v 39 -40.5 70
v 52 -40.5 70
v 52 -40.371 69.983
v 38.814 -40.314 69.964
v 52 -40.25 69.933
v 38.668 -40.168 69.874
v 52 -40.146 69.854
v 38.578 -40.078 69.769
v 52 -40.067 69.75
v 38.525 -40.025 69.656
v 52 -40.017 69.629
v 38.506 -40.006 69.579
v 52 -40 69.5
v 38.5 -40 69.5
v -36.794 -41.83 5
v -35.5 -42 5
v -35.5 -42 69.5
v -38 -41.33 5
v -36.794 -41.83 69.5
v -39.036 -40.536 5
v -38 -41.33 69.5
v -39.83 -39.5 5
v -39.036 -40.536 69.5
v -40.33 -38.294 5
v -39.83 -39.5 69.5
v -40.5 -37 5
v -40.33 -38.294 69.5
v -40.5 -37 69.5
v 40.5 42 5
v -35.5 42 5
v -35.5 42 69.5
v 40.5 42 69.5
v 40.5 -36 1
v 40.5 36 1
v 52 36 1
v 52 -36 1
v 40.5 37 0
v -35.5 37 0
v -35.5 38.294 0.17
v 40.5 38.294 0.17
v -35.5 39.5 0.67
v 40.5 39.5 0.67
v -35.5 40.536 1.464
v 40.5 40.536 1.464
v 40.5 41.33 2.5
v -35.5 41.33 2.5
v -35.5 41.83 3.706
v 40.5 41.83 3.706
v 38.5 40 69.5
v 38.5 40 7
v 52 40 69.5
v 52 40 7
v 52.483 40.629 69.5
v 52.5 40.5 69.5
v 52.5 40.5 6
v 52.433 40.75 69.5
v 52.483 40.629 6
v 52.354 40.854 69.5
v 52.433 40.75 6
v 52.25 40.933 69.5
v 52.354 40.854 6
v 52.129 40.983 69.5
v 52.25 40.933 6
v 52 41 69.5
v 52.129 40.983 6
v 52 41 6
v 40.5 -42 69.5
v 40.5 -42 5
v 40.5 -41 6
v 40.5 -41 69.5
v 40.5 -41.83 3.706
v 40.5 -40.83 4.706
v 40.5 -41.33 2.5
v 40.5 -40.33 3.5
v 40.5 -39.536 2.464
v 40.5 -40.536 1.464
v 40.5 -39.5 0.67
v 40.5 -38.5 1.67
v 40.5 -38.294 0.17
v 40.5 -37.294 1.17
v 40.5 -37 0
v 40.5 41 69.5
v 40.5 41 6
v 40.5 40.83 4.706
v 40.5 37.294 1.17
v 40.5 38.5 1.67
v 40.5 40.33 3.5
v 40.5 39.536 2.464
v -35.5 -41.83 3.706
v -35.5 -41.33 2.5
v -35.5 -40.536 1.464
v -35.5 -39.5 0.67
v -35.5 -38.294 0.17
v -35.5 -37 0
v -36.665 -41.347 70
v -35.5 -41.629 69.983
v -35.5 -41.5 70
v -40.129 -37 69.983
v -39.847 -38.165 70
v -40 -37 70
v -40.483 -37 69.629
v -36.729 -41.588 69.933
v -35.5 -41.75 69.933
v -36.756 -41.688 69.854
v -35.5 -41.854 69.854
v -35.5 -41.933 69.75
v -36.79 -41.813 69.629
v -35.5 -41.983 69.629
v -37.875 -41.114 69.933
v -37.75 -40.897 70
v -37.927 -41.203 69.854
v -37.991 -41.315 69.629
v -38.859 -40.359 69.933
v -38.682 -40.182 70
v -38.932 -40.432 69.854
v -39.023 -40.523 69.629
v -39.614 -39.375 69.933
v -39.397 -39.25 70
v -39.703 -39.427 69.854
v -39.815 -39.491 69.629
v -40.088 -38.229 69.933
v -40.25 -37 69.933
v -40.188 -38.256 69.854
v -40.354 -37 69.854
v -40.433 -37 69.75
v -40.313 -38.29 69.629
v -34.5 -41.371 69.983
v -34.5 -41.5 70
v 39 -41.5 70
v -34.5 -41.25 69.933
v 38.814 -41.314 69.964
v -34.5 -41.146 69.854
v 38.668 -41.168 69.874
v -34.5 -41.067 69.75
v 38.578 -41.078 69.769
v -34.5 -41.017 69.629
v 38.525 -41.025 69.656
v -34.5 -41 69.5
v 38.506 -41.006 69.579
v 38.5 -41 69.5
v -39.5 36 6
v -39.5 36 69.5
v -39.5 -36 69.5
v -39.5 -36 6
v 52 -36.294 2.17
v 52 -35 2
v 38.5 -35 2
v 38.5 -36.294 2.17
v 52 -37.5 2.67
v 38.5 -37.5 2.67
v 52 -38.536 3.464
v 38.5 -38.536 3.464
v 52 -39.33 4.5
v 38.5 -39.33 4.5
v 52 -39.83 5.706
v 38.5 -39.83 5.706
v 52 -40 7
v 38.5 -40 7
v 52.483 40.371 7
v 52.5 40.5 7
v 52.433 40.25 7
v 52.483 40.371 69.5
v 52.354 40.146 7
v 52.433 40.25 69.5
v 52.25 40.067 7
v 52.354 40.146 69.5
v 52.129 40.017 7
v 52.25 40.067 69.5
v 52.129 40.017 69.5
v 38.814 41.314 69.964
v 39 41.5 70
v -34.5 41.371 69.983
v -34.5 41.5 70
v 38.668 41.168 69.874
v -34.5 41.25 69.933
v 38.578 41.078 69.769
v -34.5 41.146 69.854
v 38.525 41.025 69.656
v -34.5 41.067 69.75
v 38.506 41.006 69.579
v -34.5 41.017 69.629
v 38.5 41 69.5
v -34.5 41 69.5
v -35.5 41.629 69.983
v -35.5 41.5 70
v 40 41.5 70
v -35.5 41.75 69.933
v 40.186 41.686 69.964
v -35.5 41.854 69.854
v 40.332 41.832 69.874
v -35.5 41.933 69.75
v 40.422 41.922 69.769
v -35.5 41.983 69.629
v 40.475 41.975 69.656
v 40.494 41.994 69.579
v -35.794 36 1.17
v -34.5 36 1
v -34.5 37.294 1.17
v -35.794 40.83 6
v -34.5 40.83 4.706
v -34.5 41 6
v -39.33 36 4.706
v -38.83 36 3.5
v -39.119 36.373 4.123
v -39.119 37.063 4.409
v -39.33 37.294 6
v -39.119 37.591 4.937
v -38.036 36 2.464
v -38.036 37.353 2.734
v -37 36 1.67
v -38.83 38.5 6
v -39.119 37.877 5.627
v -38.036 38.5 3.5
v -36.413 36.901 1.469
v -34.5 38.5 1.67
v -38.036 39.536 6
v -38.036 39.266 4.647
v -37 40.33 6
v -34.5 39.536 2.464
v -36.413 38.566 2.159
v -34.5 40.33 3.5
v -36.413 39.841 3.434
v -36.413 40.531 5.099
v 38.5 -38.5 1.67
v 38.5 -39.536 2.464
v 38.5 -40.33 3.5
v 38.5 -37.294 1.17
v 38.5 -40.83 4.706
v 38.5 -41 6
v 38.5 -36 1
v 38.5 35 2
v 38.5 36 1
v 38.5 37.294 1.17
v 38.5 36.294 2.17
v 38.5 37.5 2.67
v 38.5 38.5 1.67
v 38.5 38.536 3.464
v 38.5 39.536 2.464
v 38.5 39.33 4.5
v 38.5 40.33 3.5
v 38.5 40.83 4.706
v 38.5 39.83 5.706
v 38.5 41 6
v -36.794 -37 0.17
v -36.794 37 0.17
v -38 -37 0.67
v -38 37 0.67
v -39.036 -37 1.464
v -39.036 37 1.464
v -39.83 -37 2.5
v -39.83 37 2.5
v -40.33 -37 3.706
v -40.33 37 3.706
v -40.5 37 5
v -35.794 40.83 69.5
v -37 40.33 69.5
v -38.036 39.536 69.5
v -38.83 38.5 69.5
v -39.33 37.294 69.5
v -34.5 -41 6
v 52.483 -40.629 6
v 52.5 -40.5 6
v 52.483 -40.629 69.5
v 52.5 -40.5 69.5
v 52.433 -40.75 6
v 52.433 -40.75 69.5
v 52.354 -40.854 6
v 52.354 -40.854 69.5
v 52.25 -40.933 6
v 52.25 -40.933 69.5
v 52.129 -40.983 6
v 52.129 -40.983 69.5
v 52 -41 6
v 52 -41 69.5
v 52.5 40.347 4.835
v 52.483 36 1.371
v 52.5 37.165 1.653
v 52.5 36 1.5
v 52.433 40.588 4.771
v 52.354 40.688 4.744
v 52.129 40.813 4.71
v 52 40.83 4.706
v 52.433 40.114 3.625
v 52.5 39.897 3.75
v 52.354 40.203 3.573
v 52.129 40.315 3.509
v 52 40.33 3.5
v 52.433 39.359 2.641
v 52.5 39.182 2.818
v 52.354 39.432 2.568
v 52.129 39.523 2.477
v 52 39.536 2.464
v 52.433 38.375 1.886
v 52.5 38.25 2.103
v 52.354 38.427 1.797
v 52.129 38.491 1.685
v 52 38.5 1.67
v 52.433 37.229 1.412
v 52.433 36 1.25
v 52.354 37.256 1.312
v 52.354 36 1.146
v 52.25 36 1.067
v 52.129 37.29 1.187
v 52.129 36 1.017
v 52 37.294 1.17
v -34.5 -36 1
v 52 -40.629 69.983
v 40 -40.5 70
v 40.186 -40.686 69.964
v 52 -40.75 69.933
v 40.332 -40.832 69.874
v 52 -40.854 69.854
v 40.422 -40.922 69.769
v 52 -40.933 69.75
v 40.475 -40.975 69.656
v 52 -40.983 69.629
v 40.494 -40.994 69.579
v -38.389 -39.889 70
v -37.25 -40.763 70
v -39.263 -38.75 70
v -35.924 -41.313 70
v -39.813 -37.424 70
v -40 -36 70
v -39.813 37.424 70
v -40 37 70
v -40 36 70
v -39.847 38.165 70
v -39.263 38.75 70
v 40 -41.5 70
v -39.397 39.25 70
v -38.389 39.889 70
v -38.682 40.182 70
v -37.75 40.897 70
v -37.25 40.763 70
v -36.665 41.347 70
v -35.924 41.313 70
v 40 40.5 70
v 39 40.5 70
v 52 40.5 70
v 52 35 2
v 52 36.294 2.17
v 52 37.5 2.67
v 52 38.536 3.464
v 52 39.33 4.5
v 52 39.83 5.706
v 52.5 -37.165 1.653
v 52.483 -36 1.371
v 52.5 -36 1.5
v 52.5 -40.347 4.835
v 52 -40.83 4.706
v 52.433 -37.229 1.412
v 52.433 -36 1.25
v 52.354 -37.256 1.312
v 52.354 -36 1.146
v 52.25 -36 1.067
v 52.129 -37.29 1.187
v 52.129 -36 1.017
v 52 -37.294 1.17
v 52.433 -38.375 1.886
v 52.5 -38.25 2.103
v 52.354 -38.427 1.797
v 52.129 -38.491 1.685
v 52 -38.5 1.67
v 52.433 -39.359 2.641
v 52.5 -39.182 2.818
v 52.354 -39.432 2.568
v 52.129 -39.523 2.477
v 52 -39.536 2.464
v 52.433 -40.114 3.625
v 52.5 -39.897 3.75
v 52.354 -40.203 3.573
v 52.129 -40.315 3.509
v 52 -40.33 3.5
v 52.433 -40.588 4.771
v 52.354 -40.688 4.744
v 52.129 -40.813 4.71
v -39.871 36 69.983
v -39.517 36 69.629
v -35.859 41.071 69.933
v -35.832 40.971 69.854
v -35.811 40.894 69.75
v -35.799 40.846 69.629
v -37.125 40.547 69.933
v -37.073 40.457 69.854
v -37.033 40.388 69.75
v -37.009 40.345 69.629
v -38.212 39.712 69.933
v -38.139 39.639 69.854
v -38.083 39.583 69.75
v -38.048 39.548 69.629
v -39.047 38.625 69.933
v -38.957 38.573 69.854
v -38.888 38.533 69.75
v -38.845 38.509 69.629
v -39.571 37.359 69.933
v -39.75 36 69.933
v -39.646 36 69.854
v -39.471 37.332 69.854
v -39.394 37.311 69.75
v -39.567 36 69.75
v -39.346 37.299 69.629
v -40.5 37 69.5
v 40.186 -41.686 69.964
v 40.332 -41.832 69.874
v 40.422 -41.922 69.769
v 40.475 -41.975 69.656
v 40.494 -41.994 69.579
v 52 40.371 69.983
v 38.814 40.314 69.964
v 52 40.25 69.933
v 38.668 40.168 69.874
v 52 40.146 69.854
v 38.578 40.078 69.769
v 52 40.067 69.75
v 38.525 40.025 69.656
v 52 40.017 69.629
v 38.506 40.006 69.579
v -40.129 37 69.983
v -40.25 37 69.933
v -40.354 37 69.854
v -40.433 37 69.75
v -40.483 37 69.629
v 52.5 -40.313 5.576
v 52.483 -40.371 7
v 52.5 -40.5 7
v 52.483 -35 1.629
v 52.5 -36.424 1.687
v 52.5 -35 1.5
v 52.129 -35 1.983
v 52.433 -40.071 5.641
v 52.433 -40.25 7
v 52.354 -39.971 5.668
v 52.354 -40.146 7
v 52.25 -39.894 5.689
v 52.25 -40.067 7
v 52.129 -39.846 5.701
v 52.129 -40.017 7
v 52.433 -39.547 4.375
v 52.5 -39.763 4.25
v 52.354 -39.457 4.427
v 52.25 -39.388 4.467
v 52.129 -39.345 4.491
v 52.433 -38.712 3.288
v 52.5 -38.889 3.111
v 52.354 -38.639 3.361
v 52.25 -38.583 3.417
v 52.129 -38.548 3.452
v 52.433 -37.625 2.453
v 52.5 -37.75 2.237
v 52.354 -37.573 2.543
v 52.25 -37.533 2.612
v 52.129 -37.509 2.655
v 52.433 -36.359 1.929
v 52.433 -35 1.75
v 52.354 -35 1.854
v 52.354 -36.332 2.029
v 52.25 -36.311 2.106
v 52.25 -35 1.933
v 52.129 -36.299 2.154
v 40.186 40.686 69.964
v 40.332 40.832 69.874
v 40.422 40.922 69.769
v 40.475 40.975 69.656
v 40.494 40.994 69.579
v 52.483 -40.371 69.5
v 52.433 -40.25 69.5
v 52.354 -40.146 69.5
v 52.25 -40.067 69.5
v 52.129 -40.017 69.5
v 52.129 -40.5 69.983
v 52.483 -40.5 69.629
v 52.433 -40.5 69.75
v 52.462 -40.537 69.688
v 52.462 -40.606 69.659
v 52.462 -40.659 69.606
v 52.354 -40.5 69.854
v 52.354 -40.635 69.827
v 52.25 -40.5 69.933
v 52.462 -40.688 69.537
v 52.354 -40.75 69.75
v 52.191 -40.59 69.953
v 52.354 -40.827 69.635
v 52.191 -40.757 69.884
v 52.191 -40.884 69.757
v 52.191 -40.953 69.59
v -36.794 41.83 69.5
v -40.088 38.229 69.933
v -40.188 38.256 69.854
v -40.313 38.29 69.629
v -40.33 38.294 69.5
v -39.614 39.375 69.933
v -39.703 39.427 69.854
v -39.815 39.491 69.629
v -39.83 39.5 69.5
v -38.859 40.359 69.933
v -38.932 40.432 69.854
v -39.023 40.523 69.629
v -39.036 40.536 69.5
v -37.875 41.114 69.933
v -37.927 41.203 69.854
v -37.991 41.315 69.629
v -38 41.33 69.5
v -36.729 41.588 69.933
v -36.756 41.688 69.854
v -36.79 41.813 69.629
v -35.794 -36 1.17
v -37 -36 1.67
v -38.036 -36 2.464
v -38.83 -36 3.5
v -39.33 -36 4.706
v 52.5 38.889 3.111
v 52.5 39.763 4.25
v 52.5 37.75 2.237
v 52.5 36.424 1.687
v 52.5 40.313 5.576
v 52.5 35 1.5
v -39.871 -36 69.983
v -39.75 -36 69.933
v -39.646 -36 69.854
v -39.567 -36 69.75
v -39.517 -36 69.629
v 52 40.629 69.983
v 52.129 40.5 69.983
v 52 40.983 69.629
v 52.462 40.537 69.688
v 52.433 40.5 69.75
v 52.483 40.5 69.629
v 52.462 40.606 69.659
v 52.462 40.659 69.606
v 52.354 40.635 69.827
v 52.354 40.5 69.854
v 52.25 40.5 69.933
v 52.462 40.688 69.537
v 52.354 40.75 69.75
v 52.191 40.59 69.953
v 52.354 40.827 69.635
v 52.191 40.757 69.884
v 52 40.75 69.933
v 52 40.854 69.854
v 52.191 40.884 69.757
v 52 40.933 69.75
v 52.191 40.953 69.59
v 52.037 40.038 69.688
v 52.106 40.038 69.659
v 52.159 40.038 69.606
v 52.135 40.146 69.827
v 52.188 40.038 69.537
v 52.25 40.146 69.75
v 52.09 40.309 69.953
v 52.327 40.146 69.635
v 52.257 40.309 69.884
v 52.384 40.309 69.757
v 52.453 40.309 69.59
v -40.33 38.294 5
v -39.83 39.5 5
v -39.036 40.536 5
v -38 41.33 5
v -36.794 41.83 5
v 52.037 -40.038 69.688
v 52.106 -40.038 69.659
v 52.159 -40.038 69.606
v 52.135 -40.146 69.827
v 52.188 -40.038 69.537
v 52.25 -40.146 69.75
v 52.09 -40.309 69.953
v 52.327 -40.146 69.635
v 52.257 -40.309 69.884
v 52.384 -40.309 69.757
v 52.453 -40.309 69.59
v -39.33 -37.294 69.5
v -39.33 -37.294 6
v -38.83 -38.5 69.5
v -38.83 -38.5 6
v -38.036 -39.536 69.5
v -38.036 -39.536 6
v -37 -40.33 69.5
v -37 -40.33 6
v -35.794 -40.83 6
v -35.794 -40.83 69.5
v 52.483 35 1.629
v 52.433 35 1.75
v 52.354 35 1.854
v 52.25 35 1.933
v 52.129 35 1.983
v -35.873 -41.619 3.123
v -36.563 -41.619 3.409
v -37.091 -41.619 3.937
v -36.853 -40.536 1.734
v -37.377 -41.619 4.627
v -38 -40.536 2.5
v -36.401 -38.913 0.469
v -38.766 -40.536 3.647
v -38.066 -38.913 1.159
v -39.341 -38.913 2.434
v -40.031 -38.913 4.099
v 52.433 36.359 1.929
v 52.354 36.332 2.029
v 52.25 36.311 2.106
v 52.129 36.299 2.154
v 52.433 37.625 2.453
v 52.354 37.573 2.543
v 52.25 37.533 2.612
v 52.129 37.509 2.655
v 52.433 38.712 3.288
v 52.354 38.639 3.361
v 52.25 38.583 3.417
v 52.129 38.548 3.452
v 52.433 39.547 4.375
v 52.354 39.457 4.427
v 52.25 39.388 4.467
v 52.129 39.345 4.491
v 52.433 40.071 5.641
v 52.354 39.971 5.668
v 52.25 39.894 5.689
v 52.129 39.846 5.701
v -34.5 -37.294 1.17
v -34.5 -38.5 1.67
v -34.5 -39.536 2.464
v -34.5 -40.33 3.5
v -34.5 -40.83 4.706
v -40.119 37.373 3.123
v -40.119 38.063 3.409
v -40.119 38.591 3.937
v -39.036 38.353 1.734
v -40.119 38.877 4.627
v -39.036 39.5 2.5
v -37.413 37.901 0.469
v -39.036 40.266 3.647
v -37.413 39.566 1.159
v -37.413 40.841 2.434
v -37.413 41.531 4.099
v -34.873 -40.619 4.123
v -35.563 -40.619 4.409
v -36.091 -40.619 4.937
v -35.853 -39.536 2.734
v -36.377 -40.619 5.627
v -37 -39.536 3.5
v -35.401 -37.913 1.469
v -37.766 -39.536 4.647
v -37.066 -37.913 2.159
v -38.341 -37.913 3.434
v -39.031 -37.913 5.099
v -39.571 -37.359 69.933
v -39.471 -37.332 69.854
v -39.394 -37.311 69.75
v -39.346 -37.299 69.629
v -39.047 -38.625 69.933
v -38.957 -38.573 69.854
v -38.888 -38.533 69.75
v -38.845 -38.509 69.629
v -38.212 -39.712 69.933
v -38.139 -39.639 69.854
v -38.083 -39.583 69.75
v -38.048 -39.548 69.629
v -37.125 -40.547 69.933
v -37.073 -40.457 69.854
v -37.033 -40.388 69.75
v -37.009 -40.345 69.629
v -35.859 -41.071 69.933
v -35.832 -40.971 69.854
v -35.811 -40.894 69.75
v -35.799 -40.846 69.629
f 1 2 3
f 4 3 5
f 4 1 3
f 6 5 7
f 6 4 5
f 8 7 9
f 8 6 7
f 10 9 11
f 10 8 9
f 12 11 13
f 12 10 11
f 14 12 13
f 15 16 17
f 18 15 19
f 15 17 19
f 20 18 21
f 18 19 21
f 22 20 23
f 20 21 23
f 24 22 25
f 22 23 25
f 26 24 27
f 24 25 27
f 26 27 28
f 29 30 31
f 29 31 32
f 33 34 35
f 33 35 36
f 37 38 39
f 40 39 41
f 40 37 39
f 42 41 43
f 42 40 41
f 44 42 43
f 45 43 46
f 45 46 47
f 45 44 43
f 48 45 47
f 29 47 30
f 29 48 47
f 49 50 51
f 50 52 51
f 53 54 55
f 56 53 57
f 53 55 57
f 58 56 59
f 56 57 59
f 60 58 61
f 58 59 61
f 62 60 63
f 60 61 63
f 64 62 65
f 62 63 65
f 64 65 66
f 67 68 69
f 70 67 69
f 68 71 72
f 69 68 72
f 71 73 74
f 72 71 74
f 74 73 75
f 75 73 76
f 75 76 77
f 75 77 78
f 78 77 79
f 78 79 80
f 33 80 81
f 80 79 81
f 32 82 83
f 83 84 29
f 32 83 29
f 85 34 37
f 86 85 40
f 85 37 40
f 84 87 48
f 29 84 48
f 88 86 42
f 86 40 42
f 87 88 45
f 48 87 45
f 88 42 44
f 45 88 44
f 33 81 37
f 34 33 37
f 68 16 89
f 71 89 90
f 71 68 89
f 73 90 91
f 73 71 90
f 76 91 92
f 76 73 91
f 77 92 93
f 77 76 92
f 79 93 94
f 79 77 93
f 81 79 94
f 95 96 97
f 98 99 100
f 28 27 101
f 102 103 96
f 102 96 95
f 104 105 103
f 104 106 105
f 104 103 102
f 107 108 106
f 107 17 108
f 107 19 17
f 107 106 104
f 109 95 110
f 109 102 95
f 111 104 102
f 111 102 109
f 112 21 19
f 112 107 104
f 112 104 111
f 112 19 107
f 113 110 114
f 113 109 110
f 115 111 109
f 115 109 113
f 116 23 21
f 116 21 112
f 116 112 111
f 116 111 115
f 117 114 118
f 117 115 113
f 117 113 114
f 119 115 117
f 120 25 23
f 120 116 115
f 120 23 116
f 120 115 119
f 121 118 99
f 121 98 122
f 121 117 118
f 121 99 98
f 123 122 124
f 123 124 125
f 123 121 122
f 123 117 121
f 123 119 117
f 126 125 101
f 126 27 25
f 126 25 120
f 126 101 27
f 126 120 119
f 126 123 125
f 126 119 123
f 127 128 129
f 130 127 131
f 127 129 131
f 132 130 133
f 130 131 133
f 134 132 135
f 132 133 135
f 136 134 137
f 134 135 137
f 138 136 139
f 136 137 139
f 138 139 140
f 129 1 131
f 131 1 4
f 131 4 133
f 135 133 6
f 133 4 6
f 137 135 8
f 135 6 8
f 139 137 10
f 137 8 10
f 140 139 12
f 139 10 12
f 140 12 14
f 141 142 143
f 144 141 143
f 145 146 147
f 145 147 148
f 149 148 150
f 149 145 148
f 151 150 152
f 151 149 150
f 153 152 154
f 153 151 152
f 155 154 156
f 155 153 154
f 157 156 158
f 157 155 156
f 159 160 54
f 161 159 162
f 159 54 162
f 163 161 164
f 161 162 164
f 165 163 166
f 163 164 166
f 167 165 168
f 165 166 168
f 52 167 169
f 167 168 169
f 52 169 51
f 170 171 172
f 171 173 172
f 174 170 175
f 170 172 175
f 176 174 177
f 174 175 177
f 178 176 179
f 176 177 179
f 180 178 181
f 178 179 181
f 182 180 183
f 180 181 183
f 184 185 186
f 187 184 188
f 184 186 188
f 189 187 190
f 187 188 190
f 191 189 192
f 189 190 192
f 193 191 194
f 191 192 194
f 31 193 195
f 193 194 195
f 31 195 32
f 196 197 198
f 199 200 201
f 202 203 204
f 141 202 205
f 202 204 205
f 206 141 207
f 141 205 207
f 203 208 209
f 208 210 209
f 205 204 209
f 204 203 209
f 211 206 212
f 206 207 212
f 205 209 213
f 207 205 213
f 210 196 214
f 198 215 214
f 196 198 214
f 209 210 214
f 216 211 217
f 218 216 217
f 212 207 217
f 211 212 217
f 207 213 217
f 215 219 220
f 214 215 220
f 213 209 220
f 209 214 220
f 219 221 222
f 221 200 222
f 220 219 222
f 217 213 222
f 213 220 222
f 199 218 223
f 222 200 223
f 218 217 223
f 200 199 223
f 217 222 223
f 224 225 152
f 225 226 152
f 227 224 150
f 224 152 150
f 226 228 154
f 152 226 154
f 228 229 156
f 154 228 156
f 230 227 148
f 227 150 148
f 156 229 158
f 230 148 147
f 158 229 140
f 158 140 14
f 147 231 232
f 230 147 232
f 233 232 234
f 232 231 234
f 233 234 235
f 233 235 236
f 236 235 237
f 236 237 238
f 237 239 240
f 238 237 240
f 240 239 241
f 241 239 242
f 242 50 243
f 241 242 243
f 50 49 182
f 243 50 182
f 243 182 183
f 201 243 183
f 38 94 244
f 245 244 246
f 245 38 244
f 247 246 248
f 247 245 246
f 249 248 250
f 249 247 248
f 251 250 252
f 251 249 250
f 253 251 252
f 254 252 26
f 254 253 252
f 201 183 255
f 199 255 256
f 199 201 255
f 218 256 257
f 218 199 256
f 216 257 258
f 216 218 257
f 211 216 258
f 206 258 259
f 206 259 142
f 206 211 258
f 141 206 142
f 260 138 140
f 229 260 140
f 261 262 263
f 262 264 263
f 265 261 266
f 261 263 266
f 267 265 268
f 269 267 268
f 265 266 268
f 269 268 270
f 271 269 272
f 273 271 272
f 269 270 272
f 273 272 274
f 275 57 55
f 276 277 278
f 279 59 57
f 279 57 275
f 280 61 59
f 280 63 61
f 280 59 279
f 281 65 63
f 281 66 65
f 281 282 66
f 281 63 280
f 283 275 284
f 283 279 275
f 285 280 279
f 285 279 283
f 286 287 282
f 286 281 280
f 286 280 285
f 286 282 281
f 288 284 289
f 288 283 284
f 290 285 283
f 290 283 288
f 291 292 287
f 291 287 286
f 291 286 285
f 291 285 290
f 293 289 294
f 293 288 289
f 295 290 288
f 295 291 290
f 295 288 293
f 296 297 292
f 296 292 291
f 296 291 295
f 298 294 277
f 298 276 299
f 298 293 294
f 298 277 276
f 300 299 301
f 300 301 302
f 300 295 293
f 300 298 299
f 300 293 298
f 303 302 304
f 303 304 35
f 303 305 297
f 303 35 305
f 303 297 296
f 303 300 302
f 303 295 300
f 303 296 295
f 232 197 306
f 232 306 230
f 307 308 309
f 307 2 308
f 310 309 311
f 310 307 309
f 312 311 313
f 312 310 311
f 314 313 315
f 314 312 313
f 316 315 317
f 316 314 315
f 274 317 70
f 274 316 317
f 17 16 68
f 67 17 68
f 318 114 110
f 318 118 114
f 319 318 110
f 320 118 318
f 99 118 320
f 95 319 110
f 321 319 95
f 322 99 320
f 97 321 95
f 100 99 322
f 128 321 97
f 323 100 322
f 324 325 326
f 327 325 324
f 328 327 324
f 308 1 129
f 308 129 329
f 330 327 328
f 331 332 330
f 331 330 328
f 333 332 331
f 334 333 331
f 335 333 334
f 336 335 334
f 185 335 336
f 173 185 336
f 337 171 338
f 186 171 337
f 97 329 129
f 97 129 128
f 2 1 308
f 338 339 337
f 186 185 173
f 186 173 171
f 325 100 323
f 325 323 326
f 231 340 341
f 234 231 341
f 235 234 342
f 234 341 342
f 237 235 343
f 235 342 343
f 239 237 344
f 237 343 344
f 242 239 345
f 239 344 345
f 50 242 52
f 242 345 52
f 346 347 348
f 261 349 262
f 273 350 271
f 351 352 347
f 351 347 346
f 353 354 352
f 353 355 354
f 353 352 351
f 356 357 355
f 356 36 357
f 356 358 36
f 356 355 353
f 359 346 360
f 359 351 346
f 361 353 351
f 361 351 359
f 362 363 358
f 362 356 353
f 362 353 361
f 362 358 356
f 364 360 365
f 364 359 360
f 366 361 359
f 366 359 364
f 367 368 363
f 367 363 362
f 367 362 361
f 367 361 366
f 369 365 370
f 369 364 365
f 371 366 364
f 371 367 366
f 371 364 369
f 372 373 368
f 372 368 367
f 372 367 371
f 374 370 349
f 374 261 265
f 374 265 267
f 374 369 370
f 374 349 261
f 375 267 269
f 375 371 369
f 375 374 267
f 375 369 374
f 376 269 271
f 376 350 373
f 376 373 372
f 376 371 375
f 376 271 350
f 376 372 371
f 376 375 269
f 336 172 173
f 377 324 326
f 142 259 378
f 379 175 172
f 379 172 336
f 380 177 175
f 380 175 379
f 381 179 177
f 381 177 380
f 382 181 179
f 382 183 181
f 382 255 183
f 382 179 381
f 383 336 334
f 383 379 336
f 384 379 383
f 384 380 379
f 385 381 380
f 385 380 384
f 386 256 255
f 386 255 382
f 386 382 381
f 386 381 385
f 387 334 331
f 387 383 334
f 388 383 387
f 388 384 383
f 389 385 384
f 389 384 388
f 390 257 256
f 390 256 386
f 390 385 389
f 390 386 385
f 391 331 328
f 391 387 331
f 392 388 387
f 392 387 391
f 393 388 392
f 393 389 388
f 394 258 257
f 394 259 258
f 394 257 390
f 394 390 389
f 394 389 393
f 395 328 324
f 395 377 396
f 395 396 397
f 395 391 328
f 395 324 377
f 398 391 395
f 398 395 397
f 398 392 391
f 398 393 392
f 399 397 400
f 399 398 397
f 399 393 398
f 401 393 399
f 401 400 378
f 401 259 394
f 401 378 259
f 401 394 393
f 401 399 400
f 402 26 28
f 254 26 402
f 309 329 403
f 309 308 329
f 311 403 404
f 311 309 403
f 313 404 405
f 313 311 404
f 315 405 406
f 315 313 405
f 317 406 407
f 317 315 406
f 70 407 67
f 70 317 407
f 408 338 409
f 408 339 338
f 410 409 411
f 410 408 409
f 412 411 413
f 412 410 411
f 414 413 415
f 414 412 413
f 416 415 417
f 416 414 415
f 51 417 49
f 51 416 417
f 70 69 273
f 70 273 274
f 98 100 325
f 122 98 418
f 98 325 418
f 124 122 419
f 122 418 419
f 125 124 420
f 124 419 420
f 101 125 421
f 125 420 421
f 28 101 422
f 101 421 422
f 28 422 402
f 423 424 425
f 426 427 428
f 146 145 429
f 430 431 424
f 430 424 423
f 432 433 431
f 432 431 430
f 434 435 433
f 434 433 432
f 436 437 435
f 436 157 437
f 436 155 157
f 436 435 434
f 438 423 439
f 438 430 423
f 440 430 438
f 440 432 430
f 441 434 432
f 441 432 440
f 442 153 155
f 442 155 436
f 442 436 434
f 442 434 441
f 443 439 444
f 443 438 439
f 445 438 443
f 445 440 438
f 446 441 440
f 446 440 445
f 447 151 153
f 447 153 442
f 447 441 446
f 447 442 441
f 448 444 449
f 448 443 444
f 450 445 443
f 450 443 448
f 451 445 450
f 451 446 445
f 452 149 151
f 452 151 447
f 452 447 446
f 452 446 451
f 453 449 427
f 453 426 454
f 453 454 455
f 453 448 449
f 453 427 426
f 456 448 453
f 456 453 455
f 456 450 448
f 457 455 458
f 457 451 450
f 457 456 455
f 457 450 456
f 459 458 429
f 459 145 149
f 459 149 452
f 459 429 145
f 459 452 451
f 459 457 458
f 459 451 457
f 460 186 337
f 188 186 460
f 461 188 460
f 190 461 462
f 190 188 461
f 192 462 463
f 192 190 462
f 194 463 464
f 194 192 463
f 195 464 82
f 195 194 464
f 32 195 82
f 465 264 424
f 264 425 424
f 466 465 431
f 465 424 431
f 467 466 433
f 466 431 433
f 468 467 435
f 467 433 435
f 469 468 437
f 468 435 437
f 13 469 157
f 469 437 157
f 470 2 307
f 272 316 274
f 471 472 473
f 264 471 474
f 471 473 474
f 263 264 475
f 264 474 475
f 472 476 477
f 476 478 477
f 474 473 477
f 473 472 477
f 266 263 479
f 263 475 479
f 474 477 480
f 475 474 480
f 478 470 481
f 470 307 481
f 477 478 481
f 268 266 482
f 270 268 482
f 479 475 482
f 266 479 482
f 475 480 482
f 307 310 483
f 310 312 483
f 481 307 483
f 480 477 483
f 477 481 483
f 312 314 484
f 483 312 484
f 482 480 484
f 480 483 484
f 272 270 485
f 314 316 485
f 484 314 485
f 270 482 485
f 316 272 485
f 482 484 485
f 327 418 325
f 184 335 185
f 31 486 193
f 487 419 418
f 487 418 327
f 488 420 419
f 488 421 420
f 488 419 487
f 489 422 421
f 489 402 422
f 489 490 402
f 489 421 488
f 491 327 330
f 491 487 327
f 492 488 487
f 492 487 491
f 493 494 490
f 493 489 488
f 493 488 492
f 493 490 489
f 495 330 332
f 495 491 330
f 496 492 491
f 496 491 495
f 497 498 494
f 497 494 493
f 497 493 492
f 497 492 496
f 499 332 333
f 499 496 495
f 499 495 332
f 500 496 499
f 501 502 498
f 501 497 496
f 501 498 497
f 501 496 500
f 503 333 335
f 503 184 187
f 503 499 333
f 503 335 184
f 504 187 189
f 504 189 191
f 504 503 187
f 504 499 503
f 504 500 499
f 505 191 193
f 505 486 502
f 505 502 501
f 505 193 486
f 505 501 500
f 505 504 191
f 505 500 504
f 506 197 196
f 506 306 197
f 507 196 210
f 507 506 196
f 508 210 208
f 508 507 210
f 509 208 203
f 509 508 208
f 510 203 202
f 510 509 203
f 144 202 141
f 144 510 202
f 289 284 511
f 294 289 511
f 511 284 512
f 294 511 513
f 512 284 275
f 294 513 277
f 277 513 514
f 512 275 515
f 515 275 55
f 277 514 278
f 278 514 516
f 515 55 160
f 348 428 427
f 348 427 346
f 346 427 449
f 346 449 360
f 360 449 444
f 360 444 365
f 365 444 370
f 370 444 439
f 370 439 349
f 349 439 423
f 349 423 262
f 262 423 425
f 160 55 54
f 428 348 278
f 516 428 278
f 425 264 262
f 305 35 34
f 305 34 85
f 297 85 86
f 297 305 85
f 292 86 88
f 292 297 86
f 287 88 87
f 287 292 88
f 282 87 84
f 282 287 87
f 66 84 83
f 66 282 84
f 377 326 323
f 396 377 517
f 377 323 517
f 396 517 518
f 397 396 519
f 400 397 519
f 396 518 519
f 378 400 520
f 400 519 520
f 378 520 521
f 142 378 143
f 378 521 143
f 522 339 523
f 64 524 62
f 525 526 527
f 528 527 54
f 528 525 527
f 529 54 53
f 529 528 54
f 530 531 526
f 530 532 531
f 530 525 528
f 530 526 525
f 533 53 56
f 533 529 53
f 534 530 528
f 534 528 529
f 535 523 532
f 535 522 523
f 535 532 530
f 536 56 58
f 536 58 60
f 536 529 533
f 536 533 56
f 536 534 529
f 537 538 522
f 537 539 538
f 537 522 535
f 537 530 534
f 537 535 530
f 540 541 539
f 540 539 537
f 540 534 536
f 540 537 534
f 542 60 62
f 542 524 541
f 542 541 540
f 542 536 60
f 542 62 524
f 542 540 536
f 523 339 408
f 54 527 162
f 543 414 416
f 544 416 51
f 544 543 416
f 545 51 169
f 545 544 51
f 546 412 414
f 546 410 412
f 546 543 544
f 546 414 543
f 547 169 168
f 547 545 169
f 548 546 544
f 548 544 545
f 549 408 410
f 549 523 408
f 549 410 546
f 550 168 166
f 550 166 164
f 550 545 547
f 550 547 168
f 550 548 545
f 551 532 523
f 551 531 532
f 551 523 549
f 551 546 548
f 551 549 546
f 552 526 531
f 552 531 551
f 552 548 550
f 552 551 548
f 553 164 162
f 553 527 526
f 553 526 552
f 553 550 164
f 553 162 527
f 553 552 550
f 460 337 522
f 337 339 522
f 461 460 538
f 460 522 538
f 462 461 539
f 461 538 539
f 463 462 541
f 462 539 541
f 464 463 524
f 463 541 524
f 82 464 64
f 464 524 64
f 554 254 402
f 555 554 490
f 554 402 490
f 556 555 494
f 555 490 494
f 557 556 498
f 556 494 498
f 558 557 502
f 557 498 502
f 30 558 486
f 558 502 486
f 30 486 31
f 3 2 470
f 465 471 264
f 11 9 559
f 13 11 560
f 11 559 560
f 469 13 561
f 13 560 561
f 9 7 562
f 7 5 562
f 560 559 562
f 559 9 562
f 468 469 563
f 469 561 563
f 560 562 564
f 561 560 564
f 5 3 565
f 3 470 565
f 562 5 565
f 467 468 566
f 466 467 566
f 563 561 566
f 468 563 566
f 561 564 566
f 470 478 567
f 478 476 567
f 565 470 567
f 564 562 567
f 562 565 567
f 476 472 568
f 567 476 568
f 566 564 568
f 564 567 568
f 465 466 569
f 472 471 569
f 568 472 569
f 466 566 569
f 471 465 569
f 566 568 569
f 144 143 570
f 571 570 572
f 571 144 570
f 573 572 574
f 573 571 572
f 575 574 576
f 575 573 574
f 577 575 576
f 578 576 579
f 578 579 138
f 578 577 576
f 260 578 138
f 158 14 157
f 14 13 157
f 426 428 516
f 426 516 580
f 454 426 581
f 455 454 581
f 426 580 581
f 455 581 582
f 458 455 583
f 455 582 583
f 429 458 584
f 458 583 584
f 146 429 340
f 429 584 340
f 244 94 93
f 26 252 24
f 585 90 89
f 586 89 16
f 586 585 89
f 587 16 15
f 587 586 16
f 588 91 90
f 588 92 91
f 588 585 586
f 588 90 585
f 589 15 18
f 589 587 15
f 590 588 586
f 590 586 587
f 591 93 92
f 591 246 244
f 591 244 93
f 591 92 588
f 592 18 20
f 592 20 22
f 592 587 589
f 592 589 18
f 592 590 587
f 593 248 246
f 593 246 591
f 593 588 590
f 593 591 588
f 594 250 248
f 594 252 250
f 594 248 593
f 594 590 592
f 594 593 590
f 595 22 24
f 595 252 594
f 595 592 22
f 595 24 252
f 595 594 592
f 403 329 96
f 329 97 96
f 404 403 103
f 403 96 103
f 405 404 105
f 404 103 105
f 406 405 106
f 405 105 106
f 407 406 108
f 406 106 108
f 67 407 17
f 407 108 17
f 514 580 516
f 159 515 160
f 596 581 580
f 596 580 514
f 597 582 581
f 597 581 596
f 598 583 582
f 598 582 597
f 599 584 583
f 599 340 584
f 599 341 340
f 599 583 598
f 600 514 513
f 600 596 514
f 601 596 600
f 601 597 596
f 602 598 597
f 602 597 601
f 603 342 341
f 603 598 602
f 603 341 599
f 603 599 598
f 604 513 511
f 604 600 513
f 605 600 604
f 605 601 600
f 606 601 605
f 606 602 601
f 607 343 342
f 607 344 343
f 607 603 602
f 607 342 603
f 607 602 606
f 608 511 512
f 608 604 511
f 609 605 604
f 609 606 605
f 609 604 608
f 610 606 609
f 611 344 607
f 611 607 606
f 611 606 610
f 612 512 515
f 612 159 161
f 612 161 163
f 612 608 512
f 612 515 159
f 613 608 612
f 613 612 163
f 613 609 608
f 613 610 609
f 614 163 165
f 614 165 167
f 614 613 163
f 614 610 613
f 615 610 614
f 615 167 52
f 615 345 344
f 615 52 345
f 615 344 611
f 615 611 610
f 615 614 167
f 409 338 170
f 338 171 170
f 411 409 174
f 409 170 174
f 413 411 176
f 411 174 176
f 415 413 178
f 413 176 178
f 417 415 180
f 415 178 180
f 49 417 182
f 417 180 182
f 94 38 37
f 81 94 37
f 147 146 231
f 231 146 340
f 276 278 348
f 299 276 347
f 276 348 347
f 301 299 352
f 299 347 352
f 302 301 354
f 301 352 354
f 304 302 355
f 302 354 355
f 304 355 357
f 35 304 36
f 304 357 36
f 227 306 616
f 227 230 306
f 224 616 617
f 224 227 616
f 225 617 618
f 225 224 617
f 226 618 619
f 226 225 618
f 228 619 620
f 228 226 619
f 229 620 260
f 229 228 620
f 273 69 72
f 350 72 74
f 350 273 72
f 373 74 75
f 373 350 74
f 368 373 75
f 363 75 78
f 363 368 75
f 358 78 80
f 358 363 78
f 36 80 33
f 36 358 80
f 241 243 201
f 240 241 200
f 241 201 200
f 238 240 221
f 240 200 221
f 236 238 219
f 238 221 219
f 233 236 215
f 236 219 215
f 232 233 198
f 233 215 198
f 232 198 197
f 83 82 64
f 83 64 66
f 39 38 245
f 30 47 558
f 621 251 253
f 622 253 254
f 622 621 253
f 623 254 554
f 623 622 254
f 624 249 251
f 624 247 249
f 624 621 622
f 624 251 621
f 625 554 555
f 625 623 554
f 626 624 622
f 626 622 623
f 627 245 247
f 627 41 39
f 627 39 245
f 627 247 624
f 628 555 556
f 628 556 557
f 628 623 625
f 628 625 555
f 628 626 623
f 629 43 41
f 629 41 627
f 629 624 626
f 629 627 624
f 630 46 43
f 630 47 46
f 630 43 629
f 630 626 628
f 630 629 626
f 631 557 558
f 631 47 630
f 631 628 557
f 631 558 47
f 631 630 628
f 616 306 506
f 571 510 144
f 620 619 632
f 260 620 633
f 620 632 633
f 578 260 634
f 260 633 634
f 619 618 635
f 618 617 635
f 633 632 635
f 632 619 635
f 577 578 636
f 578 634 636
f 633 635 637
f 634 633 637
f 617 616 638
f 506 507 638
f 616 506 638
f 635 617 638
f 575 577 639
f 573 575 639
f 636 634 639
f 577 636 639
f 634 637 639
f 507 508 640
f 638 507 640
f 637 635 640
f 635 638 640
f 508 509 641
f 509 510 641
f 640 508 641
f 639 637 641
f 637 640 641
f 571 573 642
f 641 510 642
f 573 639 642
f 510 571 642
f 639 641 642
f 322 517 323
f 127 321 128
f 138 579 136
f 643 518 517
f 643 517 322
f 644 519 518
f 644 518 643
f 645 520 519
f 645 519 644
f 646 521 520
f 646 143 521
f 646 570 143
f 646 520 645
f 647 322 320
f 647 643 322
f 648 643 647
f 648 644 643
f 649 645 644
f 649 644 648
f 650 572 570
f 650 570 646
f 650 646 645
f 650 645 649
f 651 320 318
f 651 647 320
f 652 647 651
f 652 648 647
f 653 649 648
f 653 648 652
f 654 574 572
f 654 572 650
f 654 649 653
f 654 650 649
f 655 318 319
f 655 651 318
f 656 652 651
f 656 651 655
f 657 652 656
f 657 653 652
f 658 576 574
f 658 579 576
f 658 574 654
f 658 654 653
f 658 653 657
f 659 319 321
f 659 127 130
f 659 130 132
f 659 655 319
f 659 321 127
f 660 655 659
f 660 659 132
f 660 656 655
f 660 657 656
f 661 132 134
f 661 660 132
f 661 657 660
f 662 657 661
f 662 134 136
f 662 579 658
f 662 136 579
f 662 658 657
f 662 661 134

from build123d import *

# Parameters (mm, degrees)
F0_W     = 81
F0_H     = 84
F1_DEPTH = 70
F3_DEPTH = 69
F5_DEPTH = 2
F7_DEPTH = 14
F8_R     = 5
F9_R     = 0.49999


# Not quite as in the source:
# - a fillet or chamfer is up to 0.001 mm smaller than in the source, because OpenCascade refuses the exact size


with BuildPart() as f1:
    # F0 (on Top) → F1 (new body)
    with BuildSketch(Plane.XY):
        Rectangle(F0_W, F0_H)
    extrude(amount=F1_DEPTH)

    # F2 (on face) → F3 (cut)
    with BuildSketch(Plane.XY.offset(70)):
        Polygon((38.5, 41), (-39.5, 41), (-39.5, 20.586034283), (-39.5, -41), (38.5, -41), (38.5, -37.5405208561), align=None)
    extrude(amount=-F3_DEPTH, mode=Mode.SUBTRACT)

    # F4 (on face) → F5 (cut)
    with BuildSketch(Plane.YZ.offset(40.5)):
        Polygon((40, 2), (40, 70), (-40, 70), (-40, 42.2970801592), (-40, 2), align=None)
    extrude(amount=-F5_DEPTH, mode=Mode.SUBTRACT)

    # F6 (on face) → F7 (join)
    with BuildSketch(Plane(origin=(38.5, 0, 0), x_dir=(0, -1, 0), z_dir=(-1, 0, 0))):
        Polygon((41, 1), (41, 70), (40, 70), (40, 2), (-40, 2), (-40, 70), (-41, 70), (-41, 1), align=None)
    extrude(amount=-F7_DEPTH)

    # F8
    f8_edges = [f1.edges().sort_by_distance(p)[0] for p in [
        (-0.5, 41, 1),
        (-39.5, 0, 1),
        (-0.5, -41, 1),
        (0, 42, 0),
        (-40.5, 0, 0),
        (0, -42, 0),
        (-40.5, -42, 35),
        (-40.5, 42, 35),
        (-39.5, 41, 35.5),
        (-39.5, -41, 35.5),
        (46.5, 41, 1),
        (46.5, -41, 1),
        (45.5, -40, 2),
        (45.5, 40, 2),
    ]]
    fillet(f8_edges, radius=F8_R)

    # F9 (radius 0.5 in the source; OpenCascade refuses exactly that, so slightly less here)
    f9_edges = [f1.edges().sort_by_distance(p)[0] for p in [
        (2.5, 42, 70),
        (-39.035534, 40.535534, 70),
        (40.5, 41.5, 70),
        (-40.5, 0, 70),
        (46.5, 41, 70),
        (-39.035534, -40.535534, 70),
        (52.5, 40.5, 70),
        (2.5, -42, 70),
        (45.5, 40, 70),
        (40.5, -41.5, 70),
        (38.5, 40.5, 70),
        (46.5, -41, 70),
        (2, 41, 70),
        (52.5, -40.5, 70),
        (-38.035534, 39.535534, 70),
        (45.5, -40, 70),
        (-39.5, 0, 70),
        (38.5, -40.5, 70),
        (-38.035534, -39.535534, 70),
        (2, -41, 70),
        (52.5, -41, 38),
        (52.5, -39.535534, 2.464466),
        (52.5, 0, 1),
        (52.5, -40, 38.5),
        (52.5, 39.535534, 2.464466),
        (52.5, -38.535534, 3.464466),
        (52.5, 41, 38),
        (52.5, 0, 2),
        (52.5, 38.535534, 3.464466),
        (52.5, 40, 38.5),
    ]]
    fillet(f9_edges, radius=F9_R)


solid = f1.part
